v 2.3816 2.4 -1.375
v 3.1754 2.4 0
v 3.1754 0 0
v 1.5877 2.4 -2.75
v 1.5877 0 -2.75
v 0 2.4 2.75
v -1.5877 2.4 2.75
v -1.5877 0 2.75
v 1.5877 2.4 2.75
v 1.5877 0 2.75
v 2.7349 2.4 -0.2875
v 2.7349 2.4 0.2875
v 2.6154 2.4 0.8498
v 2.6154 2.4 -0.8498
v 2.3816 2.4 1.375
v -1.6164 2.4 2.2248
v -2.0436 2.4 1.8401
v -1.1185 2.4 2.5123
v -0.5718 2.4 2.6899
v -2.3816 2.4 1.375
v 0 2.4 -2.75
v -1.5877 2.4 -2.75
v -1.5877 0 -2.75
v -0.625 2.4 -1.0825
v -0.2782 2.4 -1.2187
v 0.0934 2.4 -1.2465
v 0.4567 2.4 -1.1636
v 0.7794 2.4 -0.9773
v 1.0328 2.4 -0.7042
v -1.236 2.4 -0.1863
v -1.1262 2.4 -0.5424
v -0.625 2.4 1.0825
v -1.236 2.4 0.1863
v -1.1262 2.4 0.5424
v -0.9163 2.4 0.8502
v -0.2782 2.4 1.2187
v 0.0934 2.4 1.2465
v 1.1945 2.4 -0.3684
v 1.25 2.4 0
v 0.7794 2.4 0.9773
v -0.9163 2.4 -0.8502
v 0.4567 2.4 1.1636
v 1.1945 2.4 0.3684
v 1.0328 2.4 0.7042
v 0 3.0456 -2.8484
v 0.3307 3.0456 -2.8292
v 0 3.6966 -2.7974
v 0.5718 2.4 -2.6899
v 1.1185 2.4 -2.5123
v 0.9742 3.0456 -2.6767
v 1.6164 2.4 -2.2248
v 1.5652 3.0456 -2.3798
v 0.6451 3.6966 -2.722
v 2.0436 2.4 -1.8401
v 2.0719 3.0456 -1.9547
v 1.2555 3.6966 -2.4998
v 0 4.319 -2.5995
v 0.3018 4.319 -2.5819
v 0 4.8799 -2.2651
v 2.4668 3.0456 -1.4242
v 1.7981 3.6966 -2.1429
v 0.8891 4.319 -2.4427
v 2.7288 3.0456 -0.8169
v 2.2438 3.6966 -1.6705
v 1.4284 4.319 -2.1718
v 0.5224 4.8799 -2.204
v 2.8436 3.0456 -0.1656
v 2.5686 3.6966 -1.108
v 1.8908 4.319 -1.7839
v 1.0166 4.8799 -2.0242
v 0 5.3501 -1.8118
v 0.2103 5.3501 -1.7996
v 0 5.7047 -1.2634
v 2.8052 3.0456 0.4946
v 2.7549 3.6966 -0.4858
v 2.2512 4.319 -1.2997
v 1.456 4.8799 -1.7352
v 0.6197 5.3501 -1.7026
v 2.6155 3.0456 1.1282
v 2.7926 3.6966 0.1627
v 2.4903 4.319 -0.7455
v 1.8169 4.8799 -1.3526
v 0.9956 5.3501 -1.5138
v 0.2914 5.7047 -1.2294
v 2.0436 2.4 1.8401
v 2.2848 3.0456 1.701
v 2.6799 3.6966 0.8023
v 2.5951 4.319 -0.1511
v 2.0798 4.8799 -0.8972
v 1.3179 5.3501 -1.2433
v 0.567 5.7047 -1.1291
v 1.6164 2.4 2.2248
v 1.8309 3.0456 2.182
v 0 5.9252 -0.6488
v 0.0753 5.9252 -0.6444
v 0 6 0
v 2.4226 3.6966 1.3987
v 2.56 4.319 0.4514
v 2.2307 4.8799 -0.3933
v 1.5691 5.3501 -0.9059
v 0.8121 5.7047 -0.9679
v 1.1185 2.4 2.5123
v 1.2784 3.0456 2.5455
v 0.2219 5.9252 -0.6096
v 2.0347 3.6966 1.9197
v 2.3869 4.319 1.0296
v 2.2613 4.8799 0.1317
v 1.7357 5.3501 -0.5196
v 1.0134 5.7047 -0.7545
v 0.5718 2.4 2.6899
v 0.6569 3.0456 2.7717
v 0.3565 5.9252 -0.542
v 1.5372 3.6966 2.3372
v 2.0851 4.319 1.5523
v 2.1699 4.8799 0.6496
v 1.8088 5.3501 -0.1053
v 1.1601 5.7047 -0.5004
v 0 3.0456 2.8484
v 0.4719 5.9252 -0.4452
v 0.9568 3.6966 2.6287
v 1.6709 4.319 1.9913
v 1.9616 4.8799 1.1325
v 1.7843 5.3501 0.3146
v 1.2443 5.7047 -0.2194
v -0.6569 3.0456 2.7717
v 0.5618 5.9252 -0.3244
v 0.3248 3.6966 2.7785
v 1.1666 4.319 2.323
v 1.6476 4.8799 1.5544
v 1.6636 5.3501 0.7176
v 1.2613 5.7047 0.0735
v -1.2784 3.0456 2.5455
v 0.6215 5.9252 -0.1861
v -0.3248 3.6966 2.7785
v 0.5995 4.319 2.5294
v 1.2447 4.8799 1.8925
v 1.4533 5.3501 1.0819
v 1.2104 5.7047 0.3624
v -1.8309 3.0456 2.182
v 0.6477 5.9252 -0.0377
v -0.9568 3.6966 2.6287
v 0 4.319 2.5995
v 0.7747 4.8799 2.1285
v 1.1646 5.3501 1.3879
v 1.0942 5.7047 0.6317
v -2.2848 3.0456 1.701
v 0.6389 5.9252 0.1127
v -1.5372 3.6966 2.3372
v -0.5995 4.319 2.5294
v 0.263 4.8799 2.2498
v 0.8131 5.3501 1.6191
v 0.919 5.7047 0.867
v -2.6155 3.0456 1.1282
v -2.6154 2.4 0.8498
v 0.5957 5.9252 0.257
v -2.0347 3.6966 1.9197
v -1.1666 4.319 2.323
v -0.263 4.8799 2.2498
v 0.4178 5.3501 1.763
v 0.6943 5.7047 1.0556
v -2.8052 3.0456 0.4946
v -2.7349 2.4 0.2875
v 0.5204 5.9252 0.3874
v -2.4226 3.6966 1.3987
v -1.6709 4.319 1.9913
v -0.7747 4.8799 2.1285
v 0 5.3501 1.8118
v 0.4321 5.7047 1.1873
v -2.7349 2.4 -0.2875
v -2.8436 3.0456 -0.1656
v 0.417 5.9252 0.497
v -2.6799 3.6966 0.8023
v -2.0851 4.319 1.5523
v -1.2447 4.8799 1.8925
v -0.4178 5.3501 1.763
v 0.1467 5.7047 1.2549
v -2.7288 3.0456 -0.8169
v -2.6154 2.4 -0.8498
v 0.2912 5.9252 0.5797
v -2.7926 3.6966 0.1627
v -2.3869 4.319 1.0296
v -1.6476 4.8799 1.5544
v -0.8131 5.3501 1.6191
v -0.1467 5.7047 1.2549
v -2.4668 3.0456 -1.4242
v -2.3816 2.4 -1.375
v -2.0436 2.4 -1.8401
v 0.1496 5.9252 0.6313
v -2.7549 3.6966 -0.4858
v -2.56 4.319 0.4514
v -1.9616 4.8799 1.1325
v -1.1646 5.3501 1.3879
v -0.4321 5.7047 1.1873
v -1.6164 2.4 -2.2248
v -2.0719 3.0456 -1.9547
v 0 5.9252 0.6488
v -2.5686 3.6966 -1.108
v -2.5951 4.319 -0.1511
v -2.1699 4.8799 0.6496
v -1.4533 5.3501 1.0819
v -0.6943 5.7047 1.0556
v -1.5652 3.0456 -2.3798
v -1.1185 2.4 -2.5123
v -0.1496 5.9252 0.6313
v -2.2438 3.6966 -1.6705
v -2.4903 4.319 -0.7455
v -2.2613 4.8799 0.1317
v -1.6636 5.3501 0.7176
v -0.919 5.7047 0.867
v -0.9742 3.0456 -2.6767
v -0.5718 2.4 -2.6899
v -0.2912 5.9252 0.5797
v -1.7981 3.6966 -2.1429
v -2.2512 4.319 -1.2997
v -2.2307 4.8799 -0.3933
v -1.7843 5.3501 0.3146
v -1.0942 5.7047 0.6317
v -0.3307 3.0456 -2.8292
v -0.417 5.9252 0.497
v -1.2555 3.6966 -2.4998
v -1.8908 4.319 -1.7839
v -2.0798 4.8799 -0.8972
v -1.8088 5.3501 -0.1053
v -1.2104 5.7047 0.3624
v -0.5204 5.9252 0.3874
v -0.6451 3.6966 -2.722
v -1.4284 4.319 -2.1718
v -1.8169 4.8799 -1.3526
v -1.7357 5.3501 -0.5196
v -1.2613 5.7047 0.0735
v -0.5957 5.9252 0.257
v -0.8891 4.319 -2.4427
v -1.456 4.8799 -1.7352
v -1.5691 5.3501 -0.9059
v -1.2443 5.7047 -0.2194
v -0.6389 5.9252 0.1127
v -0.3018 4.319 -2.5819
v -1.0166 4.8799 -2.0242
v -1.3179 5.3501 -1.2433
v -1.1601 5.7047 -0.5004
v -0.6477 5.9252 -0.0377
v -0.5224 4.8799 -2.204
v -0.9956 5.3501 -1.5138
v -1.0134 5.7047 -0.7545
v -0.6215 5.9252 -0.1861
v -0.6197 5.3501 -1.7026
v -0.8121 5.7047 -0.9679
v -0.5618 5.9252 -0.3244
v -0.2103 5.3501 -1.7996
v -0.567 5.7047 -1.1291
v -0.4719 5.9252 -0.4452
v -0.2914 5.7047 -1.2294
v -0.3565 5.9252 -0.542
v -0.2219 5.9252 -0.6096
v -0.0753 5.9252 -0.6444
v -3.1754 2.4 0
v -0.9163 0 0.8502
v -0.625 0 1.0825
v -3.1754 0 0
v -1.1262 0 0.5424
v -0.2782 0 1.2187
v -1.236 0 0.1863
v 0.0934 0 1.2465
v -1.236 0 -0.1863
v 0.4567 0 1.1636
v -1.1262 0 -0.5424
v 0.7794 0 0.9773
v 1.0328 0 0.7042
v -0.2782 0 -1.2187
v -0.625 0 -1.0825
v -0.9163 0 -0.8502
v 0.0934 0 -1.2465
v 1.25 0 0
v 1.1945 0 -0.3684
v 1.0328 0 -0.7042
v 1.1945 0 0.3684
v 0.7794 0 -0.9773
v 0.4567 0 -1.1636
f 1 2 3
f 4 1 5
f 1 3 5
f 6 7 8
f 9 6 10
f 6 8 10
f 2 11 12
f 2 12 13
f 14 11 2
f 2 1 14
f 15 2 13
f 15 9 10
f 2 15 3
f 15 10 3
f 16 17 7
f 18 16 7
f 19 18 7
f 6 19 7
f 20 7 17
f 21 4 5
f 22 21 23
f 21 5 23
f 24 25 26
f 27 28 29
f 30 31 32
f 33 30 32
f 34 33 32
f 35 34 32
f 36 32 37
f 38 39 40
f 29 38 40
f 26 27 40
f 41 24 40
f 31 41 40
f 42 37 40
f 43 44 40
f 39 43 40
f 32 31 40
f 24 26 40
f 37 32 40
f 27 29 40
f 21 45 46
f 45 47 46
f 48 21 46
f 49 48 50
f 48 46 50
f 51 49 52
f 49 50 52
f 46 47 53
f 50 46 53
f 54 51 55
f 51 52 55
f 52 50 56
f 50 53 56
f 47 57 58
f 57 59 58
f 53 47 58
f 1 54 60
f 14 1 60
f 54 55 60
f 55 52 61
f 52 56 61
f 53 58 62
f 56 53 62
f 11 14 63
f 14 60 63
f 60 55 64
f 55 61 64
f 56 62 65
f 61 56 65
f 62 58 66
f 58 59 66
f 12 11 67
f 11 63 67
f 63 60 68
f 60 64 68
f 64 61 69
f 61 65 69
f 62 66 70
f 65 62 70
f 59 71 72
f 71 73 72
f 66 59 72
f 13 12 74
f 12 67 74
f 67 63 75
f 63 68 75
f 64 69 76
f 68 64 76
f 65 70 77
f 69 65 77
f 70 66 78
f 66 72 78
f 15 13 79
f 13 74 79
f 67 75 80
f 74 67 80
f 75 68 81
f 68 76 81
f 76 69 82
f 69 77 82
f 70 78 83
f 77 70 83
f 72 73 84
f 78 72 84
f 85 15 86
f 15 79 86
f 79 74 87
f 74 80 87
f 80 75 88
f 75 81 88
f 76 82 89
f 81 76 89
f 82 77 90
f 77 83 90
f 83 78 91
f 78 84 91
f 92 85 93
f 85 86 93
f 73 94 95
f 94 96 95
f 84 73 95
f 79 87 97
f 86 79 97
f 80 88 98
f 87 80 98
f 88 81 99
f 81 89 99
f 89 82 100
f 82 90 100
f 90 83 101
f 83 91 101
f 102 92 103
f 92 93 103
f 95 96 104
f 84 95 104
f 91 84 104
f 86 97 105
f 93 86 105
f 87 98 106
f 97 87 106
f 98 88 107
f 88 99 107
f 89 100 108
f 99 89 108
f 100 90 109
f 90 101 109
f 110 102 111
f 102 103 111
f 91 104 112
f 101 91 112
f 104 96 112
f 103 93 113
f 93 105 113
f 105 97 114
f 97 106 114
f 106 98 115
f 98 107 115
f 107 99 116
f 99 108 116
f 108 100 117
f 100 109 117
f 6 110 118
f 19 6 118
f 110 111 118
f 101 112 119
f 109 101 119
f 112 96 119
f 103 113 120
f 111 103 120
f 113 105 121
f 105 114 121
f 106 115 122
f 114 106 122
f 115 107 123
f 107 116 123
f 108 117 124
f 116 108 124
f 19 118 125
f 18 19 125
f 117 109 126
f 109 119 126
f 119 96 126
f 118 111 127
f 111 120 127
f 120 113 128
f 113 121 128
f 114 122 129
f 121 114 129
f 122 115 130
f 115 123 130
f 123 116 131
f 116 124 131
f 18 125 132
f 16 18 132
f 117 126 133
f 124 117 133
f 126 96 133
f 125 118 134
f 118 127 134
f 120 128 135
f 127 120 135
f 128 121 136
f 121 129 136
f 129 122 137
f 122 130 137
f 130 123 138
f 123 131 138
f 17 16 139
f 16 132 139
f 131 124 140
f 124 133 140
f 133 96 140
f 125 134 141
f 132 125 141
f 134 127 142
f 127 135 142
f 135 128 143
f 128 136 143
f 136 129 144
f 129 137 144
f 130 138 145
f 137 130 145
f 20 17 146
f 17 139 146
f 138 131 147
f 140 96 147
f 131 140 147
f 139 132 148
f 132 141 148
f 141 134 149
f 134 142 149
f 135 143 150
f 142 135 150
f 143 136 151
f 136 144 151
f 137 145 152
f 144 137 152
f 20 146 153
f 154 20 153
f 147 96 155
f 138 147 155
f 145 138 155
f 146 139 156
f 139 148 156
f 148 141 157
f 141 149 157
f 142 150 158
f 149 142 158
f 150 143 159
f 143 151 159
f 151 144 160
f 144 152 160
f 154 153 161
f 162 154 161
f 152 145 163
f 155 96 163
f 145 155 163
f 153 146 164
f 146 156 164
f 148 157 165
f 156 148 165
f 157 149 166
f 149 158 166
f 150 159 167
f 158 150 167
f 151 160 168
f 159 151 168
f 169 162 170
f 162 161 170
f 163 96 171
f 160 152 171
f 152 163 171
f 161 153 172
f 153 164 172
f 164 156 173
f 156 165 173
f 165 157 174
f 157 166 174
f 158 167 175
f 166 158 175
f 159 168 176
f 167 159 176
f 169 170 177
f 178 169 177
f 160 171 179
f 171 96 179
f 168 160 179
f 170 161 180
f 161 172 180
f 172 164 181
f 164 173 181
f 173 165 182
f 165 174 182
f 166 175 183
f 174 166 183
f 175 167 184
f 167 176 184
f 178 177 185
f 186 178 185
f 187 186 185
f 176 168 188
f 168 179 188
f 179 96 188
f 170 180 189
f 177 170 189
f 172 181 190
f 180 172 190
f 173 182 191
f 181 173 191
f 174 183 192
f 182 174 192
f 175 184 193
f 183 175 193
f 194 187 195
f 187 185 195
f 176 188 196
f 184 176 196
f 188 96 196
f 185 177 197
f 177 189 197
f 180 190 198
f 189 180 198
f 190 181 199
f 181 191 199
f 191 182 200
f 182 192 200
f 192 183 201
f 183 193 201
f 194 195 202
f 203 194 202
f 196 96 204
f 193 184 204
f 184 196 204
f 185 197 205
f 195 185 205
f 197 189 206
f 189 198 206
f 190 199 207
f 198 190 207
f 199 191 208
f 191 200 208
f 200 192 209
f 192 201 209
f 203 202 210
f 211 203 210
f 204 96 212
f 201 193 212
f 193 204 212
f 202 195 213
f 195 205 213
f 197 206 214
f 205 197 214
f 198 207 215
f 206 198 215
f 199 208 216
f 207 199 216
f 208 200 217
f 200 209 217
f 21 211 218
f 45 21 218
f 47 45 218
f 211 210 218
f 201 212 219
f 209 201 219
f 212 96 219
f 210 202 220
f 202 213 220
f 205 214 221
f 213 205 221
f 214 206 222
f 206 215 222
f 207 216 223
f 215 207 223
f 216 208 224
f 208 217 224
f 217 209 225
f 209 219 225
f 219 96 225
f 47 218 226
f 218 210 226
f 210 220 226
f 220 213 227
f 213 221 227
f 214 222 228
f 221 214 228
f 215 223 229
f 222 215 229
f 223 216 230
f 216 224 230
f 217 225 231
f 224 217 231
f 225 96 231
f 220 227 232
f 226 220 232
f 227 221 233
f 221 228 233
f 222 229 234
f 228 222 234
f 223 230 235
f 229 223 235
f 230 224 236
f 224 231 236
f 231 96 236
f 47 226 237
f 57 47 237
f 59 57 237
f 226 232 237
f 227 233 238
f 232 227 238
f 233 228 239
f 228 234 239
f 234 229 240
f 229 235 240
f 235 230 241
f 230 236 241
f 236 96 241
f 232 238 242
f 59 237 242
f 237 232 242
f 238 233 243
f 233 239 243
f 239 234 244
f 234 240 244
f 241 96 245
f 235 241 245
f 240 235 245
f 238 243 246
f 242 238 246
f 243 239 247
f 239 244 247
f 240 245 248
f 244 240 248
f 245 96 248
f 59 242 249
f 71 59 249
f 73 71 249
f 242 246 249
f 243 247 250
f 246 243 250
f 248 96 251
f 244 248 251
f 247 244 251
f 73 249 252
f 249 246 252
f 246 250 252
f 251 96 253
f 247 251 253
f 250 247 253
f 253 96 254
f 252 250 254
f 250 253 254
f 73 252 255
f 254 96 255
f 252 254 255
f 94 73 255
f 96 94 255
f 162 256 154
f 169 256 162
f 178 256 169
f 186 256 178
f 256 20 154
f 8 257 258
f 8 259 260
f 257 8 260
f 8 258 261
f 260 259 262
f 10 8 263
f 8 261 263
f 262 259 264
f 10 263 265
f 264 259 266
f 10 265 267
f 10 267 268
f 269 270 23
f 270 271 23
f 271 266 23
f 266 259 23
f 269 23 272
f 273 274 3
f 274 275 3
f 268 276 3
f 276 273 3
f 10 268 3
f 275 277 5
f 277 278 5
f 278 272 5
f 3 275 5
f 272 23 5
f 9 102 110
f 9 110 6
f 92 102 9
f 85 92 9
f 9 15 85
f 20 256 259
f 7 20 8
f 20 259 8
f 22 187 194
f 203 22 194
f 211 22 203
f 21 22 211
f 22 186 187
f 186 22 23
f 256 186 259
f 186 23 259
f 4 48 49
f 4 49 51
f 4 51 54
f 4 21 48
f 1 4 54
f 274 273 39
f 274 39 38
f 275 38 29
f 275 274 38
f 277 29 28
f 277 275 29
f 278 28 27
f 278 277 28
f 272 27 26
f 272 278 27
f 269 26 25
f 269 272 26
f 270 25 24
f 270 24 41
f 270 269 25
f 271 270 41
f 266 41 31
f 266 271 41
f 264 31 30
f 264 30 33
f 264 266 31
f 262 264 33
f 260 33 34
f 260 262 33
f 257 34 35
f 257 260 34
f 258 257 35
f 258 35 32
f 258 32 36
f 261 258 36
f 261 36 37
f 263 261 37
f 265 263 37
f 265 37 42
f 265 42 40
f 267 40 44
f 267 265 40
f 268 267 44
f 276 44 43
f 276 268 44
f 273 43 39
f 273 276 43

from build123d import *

# Parameters (mm, degrees)
CROQUIS1_R              = 1.25
SALIENTE_EXTRUIR1_DEPTH = 2.4


with BuildPart() as part:
    # Croquis1 → Saliente-Extruir1 (new body)
    with BuildSketch(Plane(origin=(0, 0, 0), x_dir=(1, 0, 0), z_dir=(0, 1, 0))):
        Polygon((-1.58771324, 2.75), (-3.175426481, 0), (-1.58771324, -2.75), (1.58771324, -2.75), (3.175426481, 0), (1.58771324, 2.75), align=None)
        Circle(CROQUIS1_R, mode=Mode.SUBTRACT)
    extrude(amount=SALIENTE_EXTRUIR1_DEPTH)

    # Croquis3 one side → Revolución2 (revolve)
    with BuildSketch(Plane(origin=(0, 0, 0), x_dir=(0, 0, -1), z_dir=(1, 0, 0))):
        with BuildLine():
            Line((0, 6), (0, 2.4))
            Line((0, 2.4), (2.75, 2.4))
            ThreePointArc((2.75, 2.4), (2.265088298, 4.879928561), (0, 6))
        make_face()
    revolve(axis=Axis((0, 6, 0), (0, -1, 0)))


solid = part.part
